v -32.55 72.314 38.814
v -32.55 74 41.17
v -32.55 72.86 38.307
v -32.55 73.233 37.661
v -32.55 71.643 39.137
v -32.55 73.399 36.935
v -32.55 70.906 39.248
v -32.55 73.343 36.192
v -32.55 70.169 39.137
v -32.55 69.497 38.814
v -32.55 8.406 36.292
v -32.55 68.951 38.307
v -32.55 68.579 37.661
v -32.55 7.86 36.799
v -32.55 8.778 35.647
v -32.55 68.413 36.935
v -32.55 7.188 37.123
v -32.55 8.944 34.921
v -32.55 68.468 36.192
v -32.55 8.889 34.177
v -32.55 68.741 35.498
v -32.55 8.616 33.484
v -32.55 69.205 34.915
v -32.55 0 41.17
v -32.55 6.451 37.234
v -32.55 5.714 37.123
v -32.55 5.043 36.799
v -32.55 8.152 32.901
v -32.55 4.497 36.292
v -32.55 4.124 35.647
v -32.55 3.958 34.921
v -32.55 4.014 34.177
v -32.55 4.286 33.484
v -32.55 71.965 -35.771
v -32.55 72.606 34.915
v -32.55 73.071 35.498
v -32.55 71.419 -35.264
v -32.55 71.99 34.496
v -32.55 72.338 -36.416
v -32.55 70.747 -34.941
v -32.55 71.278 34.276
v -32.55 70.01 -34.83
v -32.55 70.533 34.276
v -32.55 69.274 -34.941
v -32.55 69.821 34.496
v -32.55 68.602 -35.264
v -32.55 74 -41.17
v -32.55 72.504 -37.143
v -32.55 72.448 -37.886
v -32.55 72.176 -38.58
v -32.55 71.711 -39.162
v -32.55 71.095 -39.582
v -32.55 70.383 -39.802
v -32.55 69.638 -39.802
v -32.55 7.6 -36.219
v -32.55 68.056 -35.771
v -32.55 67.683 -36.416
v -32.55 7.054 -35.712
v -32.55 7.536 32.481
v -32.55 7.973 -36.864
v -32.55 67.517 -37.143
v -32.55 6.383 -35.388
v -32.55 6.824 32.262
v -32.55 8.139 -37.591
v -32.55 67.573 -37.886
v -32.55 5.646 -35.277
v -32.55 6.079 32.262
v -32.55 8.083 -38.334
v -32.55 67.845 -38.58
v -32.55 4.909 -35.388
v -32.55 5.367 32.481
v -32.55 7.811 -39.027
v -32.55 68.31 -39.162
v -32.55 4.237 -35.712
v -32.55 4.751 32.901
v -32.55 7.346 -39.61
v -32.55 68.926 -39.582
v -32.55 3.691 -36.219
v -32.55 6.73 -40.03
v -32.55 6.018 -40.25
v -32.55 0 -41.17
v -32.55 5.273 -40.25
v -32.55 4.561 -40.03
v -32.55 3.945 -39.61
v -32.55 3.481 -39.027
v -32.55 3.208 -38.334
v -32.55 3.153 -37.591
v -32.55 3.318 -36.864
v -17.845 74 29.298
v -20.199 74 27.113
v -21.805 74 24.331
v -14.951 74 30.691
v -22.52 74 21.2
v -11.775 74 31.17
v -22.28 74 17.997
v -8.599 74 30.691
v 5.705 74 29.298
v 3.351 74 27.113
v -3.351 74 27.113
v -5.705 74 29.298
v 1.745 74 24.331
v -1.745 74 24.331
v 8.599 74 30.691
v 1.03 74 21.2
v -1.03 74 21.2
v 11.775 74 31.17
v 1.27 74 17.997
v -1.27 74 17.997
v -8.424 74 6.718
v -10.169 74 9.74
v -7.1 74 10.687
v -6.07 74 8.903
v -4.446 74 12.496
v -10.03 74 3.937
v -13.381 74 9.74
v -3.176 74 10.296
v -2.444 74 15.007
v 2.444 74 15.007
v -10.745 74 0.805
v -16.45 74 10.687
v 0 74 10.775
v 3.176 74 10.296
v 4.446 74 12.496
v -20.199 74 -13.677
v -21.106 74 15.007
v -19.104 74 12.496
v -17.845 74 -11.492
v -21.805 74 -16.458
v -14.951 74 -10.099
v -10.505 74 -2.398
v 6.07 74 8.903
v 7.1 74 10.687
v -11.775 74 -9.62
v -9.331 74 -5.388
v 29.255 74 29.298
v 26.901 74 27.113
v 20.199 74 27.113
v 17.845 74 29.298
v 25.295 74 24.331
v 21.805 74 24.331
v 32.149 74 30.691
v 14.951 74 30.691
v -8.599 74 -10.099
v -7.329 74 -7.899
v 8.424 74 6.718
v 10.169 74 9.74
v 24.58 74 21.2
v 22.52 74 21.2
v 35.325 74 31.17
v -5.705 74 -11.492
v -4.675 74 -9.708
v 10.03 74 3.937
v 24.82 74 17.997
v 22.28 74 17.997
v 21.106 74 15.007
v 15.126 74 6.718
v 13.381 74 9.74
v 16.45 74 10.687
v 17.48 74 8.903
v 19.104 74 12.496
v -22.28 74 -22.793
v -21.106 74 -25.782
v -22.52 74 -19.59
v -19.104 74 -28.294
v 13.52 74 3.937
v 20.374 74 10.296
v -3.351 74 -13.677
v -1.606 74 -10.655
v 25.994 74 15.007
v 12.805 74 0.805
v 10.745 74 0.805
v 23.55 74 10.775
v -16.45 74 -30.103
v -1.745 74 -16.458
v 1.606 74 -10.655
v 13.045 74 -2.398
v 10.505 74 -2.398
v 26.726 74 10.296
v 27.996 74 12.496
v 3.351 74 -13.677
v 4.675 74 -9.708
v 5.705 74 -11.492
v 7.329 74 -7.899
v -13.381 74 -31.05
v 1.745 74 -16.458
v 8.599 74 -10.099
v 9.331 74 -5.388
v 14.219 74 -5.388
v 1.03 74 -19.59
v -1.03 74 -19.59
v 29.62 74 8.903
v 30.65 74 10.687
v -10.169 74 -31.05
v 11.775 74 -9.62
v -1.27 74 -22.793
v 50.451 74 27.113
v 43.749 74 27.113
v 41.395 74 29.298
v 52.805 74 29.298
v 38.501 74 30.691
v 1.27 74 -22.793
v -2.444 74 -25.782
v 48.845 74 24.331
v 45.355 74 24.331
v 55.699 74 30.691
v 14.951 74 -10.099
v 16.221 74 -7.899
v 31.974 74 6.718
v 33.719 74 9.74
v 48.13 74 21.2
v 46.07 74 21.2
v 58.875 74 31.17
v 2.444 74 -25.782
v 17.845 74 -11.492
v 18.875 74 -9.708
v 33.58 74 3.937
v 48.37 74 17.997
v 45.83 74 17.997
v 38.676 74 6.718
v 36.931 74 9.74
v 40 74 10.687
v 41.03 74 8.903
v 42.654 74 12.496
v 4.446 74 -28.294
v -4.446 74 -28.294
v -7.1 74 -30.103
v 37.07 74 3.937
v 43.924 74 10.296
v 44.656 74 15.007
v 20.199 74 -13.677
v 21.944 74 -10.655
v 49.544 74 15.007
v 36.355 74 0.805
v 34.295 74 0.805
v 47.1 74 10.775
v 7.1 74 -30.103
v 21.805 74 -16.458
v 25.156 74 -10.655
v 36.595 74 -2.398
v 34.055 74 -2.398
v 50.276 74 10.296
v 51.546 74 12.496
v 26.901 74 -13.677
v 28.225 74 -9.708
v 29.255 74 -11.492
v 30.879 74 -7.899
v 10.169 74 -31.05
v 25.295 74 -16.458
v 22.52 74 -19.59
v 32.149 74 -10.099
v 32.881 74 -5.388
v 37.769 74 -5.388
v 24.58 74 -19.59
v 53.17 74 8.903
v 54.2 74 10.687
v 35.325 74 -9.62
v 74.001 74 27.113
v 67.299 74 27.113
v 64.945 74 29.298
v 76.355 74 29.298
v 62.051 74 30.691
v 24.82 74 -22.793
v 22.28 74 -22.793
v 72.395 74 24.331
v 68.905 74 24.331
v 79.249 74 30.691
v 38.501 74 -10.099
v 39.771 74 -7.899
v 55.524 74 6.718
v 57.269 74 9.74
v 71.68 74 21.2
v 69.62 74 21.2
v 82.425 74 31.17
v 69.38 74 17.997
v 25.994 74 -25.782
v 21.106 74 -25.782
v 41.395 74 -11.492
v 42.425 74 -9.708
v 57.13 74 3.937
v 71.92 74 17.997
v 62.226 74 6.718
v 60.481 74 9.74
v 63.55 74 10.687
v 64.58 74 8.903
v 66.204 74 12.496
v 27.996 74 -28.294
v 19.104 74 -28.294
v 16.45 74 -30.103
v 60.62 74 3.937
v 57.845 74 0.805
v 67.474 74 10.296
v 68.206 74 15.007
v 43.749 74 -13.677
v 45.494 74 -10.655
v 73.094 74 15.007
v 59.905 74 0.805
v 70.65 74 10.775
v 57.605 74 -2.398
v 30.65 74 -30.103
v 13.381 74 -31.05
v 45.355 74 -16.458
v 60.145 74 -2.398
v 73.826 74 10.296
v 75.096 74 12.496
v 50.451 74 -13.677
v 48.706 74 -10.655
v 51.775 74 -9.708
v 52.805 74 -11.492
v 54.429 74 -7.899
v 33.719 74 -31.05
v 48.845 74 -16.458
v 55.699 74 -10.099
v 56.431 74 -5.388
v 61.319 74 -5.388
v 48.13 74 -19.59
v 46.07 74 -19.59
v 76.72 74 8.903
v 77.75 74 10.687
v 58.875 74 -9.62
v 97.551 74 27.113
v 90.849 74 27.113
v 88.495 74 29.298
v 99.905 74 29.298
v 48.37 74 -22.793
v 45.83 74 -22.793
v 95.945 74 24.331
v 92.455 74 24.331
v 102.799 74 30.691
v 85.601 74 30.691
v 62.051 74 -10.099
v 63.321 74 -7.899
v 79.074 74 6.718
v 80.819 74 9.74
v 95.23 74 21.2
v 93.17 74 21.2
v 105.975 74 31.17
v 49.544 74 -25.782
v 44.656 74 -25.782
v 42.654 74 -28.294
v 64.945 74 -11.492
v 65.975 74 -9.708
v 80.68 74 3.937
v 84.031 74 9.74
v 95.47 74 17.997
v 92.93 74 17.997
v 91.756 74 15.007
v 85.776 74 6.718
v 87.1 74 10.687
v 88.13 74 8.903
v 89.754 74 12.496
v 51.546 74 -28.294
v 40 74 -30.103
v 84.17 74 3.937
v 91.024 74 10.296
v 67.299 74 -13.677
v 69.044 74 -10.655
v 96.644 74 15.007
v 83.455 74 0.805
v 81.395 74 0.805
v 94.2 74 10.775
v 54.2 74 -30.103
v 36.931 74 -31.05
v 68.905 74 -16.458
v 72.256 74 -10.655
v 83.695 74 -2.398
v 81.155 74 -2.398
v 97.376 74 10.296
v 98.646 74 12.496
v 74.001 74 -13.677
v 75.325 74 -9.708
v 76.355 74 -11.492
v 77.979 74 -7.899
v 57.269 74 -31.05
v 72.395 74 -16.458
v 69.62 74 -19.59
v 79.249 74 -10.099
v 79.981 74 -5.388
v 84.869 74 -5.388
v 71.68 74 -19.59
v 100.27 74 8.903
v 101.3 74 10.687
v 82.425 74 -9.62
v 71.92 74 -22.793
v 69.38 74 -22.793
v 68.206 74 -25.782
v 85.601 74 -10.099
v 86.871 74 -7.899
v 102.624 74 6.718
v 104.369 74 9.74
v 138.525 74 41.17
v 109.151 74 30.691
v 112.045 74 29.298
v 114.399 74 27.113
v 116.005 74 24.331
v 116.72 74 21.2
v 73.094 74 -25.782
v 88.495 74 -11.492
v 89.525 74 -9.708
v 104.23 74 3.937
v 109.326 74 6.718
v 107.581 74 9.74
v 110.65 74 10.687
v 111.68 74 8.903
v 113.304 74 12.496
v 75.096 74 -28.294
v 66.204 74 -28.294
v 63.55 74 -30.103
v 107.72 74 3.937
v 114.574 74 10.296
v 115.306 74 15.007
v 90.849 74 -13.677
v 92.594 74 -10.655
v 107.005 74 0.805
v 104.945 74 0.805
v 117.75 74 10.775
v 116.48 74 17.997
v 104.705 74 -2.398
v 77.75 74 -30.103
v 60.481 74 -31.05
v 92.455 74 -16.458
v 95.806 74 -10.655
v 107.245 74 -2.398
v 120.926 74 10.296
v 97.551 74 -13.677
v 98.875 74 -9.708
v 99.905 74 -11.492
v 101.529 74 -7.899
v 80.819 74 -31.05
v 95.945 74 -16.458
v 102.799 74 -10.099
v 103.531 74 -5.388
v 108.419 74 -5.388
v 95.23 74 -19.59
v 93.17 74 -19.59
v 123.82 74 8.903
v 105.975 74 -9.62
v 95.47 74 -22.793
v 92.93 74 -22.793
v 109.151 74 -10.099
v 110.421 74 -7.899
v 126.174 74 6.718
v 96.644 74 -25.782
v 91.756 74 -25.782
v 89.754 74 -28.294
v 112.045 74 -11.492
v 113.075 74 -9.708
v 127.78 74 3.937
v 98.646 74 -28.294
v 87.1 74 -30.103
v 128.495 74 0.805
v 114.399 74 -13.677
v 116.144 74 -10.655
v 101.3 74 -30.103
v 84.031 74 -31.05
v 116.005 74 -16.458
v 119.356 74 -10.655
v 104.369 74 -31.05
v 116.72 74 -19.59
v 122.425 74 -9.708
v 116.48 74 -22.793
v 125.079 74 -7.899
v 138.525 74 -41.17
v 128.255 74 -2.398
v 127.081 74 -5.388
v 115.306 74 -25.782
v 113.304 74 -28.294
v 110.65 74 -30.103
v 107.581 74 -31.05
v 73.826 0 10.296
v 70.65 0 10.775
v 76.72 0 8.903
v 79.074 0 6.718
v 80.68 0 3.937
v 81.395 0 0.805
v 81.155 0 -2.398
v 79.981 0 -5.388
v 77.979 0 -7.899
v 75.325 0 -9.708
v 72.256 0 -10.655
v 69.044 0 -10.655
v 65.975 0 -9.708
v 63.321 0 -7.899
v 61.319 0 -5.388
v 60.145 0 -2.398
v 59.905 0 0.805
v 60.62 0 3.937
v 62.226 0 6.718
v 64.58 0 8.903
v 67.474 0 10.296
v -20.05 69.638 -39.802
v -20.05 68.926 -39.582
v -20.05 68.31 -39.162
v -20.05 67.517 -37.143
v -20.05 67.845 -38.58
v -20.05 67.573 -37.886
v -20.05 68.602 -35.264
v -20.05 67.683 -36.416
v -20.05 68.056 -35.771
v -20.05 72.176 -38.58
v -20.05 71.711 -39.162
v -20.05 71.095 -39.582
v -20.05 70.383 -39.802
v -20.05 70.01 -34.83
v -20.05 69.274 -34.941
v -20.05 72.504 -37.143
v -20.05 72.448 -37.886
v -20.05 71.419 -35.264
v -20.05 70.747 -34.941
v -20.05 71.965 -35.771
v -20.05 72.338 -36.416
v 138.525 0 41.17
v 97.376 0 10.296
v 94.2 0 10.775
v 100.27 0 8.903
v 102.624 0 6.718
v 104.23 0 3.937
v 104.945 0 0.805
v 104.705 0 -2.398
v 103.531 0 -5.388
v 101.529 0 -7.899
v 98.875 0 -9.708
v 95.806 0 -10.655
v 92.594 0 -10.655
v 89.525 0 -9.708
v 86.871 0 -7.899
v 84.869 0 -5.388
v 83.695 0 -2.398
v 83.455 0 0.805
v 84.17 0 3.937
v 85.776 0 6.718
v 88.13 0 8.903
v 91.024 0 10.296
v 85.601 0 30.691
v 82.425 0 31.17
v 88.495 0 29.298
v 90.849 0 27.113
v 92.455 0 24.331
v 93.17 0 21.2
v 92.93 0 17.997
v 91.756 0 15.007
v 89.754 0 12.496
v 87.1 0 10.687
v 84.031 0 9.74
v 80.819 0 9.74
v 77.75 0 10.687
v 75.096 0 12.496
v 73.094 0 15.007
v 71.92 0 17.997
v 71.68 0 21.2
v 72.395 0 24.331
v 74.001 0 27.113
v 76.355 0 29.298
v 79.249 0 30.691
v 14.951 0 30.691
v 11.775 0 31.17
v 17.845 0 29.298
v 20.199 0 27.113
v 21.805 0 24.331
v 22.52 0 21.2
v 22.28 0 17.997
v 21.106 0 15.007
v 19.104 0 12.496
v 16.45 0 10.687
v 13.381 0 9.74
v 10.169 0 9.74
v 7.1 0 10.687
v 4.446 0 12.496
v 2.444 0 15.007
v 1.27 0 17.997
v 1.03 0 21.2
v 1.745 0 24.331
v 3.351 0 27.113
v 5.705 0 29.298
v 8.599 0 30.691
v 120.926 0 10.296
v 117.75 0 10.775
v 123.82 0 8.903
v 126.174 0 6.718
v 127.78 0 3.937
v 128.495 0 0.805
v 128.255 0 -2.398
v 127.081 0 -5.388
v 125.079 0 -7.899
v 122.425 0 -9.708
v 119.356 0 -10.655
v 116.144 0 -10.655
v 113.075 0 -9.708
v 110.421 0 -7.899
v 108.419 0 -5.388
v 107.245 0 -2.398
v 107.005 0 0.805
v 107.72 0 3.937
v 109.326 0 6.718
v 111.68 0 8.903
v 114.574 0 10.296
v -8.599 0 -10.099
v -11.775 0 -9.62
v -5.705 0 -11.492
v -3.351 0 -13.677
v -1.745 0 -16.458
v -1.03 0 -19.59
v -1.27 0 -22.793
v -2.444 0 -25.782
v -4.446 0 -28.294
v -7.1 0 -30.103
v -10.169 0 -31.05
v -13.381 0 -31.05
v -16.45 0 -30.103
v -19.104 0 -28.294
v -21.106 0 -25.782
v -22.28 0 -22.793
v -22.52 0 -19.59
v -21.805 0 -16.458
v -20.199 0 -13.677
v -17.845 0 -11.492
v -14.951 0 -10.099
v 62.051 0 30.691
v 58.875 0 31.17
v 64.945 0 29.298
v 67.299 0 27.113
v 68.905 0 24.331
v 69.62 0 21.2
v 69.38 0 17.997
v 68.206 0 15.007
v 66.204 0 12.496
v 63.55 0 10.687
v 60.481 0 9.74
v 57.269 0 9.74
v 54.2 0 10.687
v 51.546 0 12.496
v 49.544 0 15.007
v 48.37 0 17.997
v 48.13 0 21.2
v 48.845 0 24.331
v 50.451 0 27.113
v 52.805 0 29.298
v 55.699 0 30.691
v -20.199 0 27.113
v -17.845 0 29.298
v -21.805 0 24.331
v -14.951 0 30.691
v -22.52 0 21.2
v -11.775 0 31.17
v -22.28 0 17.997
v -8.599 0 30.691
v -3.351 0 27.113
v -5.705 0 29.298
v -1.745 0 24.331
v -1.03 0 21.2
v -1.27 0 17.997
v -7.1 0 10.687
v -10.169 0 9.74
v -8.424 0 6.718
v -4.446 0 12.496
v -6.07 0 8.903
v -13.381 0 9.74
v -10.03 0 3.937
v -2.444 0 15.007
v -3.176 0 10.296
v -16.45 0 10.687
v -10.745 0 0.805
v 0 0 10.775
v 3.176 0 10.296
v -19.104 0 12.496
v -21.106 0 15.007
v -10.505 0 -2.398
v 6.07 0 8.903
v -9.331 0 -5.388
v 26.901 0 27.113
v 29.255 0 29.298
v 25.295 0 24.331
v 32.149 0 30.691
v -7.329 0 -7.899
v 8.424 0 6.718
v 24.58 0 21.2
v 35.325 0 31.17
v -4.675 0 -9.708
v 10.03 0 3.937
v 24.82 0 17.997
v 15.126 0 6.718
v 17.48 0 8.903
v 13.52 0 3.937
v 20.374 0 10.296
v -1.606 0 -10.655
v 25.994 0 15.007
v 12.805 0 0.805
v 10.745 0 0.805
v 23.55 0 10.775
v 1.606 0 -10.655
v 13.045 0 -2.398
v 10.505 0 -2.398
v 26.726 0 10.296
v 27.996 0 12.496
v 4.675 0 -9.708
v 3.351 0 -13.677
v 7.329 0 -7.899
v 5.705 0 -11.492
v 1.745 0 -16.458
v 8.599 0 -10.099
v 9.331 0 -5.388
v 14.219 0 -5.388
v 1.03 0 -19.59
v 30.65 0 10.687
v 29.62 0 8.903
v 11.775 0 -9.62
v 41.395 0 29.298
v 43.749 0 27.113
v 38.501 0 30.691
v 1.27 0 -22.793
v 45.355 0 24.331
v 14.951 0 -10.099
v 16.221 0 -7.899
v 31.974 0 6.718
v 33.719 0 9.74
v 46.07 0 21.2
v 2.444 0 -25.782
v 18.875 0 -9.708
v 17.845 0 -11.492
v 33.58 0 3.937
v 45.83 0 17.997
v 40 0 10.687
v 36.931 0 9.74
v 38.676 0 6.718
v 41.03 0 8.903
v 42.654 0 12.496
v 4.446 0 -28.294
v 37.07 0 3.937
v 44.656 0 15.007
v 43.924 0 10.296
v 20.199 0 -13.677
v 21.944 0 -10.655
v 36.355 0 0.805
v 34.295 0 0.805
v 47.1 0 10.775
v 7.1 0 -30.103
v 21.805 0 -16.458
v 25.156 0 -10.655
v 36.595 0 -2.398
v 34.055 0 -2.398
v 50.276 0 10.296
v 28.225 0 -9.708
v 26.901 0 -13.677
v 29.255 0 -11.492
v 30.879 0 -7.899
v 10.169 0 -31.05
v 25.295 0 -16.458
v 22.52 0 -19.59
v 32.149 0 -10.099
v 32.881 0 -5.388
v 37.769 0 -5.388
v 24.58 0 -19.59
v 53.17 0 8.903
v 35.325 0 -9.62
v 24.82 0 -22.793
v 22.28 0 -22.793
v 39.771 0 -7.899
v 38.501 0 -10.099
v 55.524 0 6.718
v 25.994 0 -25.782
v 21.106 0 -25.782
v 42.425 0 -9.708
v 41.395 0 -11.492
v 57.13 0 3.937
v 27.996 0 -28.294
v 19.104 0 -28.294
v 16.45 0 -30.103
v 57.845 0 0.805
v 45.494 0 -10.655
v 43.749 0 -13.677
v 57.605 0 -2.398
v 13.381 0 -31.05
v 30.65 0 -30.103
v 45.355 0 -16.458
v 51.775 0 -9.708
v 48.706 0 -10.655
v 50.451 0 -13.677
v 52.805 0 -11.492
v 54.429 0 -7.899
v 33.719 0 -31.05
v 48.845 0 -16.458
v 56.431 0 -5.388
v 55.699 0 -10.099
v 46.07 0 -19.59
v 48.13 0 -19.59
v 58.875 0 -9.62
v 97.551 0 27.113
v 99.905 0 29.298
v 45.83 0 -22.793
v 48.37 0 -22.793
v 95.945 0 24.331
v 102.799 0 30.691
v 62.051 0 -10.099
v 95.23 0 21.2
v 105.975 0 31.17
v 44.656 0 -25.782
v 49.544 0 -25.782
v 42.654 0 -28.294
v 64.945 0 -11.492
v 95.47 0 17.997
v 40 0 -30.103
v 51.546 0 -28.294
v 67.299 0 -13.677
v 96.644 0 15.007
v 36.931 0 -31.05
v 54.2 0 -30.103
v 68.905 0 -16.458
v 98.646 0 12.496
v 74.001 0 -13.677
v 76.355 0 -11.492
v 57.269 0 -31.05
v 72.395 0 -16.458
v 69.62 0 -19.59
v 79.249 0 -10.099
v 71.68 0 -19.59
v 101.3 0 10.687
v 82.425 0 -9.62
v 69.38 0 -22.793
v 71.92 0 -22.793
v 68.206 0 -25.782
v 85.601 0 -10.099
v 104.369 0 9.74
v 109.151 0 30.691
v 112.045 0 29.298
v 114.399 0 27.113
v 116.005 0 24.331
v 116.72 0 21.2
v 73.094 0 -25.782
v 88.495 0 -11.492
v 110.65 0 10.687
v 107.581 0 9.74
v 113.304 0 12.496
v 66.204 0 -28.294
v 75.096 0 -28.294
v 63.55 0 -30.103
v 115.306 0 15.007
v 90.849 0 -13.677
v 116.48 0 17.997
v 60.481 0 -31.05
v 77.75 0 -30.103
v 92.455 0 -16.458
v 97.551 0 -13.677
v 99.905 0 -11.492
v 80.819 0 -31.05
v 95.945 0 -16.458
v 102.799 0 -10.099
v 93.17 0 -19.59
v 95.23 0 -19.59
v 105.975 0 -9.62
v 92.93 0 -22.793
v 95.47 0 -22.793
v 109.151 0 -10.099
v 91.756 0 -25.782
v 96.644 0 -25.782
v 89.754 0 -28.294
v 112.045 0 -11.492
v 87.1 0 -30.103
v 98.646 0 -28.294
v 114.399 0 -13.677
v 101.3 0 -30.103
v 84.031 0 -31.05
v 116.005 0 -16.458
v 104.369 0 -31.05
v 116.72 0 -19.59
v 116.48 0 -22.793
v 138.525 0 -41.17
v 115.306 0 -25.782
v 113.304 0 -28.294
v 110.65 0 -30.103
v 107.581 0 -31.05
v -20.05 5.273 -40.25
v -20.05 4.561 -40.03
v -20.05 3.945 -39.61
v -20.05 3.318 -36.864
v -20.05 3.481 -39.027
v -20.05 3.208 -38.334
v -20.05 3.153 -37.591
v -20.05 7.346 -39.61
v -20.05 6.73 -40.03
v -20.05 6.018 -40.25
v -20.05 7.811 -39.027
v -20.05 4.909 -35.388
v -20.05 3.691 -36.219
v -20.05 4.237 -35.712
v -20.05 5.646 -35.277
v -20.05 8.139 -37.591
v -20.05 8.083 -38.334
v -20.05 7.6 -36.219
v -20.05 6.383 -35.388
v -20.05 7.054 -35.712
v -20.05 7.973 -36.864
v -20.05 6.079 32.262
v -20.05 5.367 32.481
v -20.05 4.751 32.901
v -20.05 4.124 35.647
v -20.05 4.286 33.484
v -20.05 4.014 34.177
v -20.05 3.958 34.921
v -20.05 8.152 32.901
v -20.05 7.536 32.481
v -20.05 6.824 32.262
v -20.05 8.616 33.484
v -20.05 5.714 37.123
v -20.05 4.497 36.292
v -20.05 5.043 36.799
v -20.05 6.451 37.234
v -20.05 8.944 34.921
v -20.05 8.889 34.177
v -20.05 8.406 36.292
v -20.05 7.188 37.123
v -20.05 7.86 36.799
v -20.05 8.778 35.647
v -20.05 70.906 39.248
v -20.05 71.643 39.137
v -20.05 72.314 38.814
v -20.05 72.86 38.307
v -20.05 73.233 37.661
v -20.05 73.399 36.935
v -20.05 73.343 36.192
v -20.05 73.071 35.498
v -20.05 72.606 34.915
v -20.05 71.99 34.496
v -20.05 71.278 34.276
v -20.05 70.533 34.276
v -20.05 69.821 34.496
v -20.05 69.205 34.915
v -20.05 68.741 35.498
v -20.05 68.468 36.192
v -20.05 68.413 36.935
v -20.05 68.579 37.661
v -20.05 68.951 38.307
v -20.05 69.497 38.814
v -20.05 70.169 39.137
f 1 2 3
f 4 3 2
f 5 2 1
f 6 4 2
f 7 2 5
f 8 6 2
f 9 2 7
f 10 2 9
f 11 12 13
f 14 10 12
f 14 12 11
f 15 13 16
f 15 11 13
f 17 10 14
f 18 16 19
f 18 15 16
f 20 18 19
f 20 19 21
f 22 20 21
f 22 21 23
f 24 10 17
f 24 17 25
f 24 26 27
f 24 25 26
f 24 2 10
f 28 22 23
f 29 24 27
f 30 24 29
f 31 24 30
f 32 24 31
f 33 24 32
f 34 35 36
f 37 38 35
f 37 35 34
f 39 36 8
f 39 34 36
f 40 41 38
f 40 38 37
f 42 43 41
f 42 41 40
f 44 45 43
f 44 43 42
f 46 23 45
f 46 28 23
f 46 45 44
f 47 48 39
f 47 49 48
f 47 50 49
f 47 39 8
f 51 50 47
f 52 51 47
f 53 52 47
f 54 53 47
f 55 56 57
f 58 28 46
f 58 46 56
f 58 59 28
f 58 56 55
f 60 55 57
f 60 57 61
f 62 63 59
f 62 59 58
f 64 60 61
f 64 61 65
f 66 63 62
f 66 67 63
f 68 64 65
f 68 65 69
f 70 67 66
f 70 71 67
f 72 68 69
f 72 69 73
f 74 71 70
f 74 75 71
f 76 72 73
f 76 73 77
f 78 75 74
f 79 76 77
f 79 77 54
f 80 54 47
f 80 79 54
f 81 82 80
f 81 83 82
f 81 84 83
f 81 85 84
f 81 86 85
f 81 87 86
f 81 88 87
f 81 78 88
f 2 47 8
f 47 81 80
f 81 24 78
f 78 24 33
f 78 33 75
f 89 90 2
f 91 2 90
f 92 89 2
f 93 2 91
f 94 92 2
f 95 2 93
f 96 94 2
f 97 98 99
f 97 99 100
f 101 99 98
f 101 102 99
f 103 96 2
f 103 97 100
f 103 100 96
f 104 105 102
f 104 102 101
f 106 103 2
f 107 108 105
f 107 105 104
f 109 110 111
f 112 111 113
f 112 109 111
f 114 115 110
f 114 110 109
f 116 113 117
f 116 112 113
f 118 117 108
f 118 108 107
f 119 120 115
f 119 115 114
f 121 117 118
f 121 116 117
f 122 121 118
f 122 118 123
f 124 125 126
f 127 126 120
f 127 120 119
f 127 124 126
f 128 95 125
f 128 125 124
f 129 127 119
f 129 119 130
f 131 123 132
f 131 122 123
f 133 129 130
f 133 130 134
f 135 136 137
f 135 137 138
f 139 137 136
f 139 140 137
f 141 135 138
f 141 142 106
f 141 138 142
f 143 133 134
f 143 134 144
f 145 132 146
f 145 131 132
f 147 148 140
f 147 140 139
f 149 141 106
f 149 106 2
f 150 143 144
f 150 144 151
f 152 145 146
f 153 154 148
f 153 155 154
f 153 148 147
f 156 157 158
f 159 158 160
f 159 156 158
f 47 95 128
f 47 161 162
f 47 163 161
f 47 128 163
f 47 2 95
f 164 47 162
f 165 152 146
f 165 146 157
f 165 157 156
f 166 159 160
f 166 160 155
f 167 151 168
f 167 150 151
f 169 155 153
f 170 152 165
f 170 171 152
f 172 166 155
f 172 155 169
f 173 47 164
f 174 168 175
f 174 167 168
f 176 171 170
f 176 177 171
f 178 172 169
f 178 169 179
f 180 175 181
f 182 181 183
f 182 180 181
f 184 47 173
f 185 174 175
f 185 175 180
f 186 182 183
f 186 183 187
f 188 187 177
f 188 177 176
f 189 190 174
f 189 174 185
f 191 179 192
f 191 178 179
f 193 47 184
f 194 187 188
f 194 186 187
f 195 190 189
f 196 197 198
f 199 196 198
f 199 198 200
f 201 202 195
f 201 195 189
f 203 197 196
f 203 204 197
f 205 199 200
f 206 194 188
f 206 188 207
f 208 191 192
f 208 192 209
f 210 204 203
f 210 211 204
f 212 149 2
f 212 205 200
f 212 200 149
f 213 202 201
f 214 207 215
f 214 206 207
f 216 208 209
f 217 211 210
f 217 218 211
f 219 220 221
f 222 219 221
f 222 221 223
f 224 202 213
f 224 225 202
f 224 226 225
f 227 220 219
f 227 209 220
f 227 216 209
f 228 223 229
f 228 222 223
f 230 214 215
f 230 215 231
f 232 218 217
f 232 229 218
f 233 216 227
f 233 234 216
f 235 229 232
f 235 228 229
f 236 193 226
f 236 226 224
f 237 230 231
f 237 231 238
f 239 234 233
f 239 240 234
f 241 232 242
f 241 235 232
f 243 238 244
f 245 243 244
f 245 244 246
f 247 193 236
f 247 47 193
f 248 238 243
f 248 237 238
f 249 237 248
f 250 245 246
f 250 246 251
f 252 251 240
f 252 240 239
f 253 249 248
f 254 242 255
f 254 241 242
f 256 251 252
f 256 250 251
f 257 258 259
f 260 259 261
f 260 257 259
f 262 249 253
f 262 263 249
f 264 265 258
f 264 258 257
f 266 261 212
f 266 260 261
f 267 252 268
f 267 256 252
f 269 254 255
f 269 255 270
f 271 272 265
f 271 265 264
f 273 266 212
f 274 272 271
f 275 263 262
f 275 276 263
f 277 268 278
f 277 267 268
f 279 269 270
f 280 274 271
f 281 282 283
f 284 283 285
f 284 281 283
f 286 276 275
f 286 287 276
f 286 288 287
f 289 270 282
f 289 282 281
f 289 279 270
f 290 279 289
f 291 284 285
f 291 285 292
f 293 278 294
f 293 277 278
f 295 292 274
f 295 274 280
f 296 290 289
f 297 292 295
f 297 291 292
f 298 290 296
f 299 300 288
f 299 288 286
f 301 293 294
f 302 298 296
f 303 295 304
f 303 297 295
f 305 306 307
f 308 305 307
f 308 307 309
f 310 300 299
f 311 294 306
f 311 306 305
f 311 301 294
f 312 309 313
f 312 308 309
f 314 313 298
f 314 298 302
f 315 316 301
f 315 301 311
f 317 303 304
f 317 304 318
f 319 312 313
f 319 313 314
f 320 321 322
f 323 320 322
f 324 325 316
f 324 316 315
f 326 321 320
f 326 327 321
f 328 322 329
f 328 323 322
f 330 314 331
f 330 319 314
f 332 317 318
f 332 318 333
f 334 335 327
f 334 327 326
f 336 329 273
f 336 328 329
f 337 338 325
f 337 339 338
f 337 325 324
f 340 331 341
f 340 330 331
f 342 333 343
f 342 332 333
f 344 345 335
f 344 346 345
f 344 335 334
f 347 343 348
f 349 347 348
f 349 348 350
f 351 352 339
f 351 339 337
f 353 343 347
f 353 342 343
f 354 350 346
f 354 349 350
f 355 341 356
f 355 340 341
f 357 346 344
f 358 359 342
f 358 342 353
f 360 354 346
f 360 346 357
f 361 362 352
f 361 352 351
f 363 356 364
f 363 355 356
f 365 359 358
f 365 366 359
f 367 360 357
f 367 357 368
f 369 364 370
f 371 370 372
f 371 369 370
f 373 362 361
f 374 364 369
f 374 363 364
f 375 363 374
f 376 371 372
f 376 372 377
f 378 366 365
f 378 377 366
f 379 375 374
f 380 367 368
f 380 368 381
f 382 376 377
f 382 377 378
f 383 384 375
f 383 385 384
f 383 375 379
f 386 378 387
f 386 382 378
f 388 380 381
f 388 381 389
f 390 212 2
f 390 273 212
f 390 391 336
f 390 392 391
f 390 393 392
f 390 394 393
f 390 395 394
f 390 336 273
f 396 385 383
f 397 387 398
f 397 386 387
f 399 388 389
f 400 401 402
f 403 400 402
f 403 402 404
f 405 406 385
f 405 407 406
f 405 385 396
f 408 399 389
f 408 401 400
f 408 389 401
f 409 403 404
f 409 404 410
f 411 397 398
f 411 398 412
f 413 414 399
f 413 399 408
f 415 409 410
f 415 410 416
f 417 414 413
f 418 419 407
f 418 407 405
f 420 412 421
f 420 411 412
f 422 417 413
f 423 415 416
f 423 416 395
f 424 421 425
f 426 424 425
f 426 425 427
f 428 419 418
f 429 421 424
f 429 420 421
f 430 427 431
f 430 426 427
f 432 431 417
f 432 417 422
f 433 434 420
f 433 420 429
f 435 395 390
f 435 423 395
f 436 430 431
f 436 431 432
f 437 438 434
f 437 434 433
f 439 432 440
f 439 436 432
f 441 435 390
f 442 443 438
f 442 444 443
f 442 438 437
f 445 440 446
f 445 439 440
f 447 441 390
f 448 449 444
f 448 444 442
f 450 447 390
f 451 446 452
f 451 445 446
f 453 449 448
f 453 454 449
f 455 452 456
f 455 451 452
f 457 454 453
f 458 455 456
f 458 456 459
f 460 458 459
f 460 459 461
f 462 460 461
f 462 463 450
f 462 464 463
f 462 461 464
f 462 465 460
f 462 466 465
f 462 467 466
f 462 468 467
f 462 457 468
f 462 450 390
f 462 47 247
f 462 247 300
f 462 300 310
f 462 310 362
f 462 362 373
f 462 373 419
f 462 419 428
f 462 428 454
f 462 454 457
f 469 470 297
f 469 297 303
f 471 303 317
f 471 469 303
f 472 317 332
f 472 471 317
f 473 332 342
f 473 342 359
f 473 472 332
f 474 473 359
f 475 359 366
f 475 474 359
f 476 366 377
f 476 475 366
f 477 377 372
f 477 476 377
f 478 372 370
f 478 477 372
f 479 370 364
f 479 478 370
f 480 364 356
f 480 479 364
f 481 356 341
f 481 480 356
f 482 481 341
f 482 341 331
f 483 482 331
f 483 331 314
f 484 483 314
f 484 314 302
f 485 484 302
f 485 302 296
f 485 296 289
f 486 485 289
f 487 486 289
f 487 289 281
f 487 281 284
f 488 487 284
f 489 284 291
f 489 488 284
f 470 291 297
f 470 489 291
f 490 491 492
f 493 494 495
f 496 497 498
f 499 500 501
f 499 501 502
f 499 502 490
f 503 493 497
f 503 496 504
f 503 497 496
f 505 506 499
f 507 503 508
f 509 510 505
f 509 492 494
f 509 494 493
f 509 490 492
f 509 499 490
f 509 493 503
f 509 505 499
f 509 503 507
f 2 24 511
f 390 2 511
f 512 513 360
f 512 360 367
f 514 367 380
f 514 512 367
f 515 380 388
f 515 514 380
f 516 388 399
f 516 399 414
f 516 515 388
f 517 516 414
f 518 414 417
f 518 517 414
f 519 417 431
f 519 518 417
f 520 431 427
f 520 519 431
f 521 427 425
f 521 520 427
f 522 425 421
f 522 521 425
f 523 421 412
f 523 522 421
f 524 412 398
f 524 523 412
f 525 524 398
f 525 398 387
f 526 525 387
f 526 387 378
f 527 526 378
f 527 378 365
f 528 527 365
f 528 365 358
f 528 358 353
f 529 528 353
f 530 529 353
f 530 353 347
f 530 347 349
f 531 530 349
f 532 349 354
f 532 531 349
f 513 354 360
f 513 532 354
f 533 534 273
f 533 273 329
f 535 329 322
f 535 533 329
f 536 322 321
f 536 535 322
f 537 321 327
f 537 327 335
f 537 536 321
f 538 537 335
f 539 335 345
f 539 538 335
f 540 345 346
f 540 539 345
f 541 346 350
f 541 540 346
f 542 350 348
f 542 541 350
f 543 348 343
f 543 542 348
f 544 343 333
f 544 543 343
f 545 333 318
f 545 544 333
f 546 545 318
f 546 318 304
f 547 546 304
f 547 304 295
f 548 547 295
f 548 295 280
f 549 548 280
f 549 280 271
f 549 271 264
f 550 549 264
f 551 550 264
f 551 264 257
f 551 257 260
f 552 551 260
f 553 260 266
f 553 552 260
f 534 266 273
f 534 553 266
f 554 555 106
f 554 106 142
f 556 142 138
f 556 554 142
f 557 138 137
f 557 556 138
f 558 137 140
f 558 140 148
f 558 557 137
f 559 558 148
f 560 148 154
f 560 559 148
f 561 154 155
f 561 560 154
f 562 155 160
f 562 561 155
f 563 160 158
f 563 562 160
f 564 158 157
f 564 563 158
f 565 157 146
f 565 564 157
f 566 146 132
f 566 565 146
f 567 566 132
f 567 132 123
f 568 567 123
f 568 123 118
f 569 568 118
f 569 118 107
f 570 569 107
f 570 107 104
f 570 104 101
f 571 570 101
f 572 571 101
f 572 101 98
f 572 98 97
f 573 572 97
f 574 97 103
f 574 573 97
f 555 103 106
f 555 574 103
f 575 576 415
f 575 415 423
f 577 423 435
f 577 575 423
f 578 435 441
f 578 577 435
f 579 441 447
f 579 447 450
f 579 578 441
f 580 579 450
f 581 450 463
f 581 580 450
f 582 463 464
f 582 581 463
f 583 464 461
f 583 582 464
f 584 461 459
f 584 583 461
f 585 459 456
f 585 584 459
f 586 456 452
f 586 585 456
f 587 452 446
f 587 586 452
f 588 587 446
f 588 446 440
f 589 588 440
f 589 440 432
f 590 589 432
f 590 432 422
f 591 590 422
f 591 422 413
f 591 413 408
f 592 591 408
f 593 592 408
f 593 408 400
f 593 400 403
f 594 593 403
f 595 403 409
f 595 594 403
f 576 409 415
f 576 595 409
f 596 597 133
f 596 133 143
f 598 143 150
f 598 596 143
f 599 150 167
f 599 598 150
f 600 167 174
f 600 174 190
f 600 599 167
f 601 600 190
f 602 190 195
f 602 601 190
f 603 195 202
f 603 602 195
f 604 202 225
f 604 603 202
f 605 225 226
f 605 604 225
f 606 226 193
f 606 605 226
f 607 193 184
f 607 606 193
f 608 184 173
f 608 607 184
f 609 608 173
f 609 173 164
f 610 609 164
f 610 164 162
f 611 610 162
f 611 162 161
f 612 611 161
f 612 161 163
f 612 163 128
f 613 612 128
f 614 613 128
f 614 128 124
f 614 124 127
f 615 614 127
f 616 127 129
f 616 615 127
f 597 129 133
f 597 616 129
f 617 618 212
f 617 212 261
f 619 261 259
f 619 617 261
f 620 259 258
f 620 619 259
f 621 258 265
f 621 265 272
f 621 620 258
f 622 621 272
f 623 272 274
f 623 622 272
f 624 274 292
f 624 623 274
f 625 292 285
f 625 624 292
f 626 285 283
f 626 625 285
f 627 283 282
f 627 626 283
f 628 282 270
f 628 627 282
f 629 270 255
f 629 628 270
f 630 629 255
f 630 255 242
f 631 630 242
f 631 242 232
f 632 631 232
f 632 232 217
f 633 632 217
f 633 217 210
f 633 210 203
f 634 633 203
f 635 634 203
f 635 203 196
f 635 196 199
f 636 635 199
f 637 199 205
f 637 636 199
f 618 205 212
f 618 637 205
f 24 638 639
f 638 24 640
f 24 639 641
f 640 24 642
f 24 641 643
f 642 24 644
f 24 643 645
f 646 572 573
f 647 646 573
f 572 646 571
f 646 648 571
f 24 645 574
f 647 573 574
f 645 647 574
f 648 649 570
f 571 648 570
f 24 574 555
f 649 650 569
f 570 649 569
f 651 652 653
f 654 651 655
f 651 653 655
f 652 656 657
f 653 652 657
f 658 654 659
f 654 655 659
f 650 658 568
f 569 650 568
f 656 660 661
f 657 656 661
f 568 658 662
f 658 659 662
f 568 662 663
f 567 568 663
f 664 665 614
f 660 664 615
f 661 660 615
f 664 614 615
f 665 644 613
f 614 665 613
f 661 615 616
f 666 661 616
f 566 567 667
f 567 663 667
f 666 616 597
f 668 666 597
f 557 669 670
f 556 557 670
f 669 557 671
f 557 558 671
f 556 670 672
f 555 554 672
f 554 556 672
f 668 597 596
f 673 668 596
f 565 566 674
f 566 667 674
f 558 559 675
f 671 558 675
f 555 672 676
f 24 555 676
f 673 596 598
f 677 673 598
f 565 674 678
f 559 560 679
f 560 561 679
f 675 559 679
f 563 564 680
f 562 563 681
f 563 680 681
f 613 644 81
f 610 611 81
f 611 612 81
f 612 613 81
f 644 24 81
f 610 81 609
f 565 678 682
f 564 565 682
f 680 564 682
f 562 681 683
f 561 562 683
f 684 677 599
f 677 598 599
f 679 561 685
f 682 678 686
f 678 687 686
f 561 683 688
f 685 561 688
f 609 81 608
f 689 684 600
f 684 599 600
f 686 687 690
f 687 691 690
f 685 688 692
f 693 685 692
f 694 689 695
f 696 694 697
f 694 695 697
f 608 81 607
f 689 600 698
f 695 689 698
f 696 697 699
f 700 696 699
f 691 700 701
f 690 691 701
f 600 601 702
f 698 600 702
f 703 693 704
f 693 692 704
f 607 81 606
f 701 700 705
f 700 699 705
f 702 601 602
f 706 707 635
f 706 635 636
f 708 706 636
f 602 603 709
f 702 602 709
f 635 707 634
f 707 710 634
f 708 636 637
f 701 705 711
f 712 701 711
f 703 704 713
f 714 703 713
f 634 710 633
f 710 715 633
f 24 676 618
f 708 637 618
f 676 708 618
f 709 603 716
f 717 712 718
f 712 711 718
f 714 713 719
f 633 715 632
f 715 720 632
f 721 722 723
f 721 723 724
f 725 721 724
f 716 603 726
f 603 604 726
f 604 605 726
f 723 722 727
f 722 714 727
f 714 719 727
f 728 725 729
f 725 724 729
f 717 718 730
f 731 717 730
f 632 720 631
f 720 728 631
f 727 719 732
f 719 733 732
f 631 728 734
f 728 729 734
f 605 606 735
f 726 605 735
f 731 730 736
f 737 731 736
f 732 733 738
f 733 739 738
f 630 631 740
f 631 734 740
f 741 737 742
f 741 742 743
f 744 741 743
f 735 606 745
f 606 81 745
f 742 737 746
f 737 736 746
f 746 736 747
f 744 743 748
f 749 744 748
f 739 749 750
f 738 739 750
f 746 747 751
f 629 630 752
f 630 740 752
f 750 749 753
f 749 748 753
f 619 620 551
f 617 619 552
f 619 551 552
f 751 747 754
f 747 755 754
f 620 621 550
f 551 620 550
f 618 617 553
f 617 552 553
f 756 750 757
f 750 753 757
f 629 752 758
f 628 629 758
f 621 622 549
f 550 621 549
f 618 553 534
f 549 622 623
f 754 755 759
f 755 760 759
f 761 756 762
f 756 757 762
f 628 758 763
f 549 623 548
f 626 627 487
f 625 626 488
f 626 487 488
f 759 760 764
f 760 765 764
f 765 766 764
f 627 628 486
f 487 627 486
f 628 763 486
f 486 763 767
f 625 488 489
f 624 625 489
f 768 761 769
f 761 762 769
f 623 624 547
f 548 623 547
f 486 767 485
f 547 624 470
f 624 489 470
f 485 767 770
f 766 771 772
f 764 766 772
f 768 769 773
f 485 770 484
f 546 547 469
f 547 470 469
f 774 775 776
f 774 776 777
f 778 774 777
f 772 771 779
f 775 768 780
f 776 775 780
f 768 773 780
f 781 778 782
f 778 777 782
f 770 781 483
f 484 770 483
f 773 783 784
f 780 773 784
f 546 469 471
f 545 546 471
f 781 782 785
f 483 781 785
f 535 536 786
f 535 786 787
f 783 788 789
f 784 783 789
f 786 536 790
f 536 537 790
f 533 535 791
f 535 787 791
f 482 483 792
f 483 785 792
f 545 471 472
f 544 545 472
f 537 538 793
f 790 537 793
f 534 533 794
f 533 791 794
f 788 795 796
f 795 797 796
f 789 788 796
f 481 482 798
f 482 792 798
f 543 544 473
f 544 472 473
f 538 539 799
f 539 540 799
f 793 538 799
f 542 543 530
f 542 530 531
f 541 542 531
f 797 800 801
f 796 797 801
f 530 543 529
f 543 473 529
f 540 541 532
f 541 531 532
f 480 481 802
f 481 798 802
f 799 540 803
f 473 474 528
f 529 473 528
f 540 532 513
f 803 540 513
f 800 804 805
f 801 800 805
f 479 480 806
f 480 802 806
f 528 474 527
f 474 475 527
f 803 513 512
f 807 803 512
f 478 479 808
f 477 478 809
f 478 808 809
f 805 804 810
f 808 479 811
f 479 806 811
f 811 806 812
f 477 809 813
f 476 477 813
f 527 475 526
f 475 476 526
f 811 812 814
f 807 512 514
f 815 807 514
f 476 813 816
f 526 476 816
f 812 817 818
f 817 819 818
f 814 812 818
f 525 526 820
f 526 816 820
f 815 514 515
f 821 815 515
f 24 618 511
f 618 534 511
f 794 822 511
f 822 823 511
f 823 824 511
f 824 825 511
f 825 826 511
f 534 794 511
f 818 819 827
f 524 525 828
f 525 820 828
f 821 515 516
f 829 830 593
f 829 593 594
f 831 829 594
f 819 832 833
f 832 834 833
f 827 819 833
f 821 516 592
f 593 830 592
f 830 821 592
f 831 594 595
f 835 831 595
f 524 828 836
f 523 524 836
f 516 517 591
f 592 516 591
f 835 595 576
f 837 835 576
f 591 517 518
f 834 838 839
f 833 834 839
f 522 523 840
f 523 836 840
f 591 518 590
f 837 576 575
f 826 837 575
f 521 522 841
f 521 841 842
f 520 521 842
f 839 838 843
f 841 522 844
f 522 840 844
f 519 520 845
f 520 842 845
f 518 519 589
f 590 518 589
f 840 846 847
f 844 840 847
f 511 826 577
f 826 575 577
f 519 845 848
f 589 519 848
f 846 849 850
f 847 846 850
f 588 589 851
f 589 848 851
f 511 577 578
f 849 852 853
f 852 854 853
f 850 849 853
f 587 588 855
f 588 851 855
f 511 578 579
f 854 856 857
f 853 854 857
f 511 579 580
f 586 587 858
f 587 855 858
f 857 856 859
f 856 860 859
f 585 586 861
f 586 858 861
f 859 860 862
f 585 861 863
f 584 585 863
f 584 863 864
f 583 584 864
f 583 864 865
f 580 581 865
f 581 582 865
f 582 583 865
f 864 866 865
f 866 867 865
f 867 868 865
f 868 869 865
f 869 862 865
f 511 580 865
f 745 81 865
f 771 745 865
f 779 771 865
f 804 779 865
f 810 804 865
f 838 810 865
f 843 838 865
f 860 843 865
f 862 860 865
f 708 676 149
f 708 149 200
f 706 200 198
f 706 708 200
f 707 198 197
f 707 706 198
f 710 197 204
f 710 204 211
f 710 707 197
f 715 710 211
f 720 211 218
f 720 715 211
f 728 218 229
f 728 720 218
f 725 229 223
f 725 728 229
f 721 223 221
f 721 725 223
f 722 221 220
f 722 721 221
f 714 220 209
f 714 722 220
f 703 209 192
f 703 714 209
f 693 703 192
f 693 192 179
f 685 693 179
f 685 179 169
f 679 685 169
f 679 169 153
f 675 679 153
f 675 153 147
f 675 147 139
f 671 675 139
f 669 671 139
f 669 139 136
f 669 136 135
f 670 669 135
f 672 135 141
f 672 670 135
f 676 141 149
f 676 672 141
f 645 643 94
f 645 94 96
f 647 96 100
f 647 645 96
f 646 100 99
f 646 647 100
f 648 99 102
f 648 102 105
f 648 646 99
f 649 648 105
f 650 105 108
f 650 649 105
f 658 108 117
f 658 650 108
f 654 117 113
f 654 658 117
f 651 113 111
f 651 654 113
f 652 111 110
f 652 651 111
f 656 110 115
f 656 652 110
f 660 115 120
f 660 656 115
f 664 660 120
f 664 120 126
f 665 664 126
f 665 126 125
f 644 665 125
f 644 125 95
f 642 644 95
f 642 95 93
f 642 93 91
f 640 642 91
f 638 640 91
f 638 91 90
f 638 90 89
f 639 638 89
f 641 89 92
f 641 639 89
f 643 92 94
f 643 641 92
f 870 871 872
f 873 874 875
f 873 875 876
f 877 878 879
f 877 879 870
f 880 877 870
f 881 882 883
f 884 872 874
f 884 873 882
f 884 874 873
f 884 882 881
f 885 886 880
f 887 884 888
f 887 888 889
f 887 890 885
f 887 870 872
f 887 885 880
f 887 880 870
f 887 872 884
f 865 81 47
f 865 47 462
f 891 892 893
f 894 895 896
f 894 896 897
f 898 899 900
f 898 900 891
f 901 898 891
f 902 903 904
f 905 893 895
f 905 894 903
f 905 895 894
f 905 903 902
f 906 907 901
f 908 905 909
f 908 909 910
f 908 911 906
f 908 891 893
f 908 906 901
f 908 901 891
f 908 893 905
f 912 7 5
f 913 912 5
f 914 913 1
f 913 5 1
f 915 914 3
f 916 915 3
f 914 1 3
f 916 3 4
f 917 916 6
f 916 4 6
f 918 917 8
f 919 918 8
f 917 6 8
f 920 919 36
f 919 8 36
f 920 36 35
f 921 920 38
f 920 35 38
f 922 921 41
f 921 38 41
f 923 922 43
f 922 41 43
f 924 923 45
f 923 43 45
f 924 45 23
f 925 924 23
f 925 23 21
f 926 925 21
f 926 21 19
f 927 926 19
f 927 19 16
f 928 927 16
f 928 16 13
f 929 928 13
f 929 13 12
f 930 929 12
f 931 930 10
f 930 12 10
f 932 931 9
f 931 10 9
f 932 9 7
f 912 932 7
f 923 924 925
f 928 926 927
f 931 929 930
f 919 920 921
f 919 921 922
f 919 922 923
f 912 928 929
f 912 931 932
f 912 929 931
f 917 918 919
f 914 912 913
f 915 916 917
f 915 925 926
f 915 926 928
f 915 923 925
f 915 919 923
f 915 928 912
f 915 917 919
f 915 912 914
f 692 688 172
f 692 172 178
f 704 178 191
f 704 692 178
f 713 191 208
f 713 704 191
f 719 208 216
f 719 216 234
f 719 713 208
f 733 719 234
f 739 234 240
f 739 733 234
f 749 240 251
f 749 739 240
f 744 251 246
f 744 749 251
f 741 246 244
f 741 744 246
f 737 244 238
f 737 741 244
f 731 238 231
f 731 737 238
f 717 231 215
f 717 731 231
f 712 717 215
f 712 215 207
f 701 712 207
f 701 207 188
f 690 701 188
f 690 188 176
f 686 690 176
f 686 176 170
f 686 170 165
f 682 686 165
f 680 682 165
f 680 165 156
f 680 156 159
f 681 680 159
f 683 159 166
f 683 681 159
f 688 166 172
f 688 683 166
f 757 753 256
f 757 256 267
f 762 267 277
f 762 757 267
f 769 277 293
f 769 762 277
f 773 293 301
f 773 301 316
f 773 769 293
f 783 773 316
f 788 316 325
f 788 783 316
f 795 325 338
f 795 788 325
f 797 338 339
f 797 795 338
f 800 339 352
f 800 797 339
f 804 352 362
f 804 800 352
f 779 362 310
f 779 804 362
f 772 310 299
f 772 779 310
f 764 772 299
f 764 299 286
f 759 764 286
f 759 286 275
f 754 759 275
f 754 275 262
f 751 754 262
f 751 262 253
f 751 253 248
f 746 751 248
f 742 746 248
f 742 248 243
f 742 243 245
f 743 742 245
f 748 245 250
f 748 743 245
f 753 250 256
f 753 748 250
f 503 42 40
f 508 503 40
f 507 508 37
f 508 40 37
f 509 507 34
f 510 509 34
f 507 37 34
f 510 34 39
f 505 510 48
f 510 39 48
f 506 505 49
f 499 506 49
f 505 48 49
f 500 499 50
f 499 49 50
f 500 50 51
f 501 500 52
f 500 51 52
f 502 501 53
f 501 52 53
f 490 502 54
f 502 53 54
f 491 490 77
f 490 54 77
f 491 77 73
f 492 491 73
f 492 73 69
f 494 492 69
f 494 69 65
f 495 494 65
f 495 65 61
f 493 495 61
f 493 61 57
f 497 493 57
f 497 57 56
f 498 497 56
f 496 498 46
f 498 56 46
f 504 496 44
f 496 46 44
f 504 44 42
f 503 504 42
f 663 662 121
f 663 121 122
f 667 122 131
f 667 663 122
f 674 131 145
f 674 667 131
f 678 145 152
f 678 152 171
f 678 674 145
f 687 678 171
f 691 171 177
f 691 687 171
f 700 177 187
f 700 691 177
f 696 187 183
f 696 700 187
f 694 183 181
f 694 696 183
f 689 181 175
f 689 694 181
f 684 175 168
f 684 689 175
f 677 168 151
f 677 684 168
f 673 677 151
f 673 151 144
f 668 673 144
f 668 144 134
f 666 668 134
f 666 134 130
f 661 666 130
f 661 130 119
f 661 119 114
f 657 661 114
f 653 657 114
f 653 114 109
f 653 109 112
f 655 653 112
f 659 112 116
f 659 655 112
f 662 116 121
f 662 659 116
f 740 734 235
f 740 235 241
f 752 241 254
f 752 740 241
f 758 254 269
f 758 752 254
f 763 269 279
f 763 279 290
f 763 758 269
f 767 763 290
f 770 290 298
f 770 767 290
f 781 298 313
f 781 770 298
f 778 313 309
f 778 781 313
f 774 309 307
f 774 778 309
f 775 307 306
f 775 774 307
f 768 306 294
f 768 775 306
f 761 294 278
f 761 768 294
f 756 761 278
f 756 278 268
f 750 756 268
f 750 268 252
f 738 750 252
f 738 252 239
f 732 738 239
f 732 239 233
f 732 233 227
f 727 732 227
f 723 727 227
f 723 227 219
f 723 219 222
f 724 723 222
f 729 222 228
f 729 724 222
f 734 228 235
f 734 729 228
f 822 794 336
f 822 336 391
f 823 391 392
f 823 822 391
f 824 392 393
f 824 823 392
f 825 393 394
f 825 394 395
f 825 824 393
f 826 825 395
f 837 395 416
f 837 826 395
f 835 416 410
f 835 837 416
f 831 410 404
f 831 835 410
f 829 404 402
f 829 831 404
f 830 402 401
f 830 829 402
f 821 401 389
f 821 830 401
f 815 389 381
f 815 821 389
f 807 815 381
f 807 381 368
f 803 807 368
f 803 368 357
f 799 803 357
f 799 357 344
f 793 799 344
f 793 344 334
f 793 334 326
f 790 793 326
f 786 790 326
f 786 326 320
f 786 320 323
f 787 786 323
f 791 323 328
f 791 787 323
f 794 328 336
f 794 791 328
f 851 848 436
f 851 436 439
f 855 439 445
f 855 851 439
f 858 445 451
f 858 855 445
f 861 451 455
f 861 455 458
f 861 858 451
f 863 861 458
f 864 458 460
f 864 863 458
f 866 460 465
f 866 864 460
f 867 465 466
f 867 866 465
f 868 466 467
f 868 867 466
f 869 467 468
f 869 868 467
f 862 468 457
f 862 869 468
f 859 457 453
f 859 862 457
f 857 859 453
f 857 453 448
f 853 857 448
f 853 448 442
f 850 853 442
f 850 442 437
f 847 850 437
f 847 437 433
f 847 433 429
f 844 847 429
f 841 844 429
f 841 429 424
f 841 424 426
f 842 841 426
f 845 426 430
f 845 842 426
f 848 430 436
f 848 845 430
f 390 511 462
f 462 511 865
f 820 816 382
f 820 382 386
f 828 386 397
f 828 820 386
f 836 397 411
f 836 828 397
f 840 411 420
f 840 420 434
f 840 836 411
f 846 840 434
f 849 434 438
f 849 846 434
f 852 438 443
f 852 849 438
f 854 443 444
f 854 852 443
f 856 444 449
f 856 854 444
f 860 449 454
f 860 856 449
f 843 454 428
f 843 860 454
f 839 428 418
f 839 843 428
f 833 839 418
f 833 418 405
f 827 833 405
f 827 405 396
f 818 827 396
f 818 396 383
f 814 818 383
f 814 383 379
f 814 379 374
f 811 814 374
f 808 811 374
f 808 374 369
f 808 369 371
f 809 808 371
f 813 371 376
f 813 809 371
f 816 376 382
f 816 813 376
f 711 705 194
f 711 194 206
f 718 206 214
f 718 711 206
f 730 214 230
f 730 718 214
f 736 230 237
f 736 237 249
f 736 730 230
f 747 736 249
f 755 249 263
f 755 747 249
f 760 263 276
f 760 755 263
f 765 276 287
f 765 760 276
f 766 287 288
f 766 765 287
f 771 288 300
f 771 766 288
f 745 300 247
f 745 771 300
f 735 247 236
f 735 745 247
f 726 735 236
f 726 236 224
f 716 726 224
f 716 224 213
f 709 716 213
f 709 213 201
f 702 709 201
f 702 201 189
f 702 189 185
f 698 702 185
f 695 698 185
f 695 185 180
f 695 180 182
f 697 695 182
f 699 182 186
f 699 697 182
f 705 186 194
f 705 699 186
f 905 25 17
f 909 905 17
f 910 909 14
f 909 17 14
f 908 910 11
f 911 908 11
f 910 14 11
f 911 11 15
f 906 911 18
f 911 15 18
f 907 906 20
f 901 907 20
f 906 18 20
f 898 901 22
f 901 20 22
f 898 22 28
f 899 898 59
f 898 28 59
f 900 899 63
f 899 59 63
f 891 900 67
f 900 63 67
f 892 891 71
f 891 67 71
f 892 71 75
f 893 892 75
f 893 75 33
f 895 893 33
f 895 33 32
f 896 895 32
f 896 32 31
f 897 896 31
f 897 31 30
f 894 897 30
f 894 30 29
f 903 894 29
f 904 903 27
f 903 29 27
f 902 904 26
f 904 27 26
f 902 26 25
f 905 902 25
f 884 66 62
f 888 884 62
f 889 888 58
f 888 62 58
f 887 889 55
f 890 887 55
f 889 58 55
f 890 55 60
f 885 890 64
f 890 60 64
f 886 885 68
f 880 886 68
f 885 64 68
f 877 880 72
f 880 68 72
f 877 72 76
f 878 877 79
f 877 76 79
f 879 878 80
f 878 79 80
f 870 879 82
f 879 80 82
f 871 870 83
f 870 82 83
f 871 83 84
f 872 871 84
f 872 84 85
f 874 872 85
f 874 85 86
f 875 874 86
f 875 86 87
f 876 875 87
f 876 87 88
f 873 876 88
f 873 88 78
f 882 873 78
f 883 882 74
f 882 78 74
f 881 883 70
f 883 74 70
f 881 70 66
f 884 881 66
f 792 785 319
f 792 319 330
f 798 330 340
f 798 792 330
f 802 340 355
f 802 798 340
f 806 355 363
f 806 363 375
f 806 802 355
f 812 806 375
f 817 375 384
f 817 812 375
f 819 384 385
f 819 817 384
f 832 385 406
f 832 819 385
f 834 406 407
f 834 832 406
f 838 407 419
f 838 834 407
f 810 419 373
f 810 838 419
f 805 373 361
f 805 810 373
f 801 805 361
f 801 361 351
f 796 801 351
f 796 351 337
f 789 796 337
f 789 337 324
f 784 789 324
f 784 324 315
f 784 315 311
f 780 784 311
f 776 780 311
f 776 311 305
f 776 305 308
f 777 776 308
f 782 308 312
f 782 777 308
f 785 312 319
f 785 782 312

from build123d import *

# Parameters (mm, degrees)
SKETCH1_W           = 171.075
SKETCH1_H           = 82.339796518
SKETCH1_R           = 10.775
BOSS_EXTRUDE1_DEPTH = 74
SKETCH2_R           = 2.5
CUT_EXTRUDE1_DEPTH  = 12.5


with BuildPart() as part:
    # Sketch1 → Boss-Extrude1 (new body)
    with BuildSketch(Plane(origin=(0, 0, 0), x_dir=(1, 0, 0), z_dir=(0, 1, 0))):
        with Locations((52.9875, 0)):
            Rectangle(SKETCH1_W, SKETCH1_H)
        Circle(SKETCH1_R, mode=Mode.SUBTRACT)
        with Locations((-11.775, 20.394898259)):
            Circle(SKETCH1_R, mode=Mode.SUBTRACT)
        with Locations((-11.775, -20.394898259)):
            Circle(SKETCH1_R, mode=Mode.SUBTRACT)
        with Locations((11.775, 20.394898259)):
            Circle(SKETCH1_R, mode=Mode.SUBTRACT)
        with Locations((23.55, 0)):
            Circle(SKETCH1_R, mode=Mode.SUBTRACT)
        with Locations((11.775, -20.394898259)):
            Circle(SKETCH1_R, mode=Mode.SUBTRACT)
        with Locations((35.325, 20.394898259)):
            Circle(SKETCH1_R, mode=Mode.SUBTRACT)
        with Locations((47.1, 0)):
            Circle(SKETCH1_R, mode=Mode.SUBTRACT)
        with Locations((35.325, -20.394898259)):
            Circle(SKETCH1_R, mode=Mode.SUBTRACT)
        with Locations((58.875, 20.394898259)):
            Circle(SKETCH1_R, mode=Mode.SUBTRACT)
        with Locations((70.65, 0)):
            Circle(SKETCH1_R, mode=Mode.SUBTRACT)
        with Locations((58.875, -20.394898259)):
            Circle(SKETCH1_R, mode=Mode.SUBTRACT)
        with Locations((82.425, 20.394898259)):
            Circle(SKETCH1_R, mode=Mode.SUBTRACT)
        with Locations((94.2, 0)):
            Circle(SKETCH1_R, mode=Mode.SUBTRACT)
        with Locations((82.425, -20.394898259)):
            Circle(SKETCH1_R, mode=Mode.SUBTRACT)
        with Locations((105.975, 20.394898259)):
            Circle(SKETCH1_R, mode=Mode.SUBTRACT)
        with Locations((117.75, 0)):
            Circle(SKETCH1_R, mode=Mode.SUBTRACT)
        with Locations((105.975, -20.394898259)):
            Circle(SKETCH1_R, mode=Mode.SUBTRACT)
    extrude(amount=BOSS_EXTRUDE1_DEPTH)

    # Sketch2 → Cut-Extrude1 (cut)
    with BuildSketch(Plane.ZY.offset(32.55)):
        with Locations((-37.329831377, 70.010492375)):
            Circle(SKETCH2_R)
        with Locations((36.747951512, 70.905692168)):
            Circle(SKETCH2_R)
        with Locations((34.733751977, 6.451307056)):
            Circle(SKETCH2_R)
        with Locations((-37.777431274, 5.645627242)):
            Circle(SKETCH2_R)
    extrude(amount=-CUT_EXTRUDE1_DEPTH, mode=Mode.SUBTRACT)


solid = part.part
